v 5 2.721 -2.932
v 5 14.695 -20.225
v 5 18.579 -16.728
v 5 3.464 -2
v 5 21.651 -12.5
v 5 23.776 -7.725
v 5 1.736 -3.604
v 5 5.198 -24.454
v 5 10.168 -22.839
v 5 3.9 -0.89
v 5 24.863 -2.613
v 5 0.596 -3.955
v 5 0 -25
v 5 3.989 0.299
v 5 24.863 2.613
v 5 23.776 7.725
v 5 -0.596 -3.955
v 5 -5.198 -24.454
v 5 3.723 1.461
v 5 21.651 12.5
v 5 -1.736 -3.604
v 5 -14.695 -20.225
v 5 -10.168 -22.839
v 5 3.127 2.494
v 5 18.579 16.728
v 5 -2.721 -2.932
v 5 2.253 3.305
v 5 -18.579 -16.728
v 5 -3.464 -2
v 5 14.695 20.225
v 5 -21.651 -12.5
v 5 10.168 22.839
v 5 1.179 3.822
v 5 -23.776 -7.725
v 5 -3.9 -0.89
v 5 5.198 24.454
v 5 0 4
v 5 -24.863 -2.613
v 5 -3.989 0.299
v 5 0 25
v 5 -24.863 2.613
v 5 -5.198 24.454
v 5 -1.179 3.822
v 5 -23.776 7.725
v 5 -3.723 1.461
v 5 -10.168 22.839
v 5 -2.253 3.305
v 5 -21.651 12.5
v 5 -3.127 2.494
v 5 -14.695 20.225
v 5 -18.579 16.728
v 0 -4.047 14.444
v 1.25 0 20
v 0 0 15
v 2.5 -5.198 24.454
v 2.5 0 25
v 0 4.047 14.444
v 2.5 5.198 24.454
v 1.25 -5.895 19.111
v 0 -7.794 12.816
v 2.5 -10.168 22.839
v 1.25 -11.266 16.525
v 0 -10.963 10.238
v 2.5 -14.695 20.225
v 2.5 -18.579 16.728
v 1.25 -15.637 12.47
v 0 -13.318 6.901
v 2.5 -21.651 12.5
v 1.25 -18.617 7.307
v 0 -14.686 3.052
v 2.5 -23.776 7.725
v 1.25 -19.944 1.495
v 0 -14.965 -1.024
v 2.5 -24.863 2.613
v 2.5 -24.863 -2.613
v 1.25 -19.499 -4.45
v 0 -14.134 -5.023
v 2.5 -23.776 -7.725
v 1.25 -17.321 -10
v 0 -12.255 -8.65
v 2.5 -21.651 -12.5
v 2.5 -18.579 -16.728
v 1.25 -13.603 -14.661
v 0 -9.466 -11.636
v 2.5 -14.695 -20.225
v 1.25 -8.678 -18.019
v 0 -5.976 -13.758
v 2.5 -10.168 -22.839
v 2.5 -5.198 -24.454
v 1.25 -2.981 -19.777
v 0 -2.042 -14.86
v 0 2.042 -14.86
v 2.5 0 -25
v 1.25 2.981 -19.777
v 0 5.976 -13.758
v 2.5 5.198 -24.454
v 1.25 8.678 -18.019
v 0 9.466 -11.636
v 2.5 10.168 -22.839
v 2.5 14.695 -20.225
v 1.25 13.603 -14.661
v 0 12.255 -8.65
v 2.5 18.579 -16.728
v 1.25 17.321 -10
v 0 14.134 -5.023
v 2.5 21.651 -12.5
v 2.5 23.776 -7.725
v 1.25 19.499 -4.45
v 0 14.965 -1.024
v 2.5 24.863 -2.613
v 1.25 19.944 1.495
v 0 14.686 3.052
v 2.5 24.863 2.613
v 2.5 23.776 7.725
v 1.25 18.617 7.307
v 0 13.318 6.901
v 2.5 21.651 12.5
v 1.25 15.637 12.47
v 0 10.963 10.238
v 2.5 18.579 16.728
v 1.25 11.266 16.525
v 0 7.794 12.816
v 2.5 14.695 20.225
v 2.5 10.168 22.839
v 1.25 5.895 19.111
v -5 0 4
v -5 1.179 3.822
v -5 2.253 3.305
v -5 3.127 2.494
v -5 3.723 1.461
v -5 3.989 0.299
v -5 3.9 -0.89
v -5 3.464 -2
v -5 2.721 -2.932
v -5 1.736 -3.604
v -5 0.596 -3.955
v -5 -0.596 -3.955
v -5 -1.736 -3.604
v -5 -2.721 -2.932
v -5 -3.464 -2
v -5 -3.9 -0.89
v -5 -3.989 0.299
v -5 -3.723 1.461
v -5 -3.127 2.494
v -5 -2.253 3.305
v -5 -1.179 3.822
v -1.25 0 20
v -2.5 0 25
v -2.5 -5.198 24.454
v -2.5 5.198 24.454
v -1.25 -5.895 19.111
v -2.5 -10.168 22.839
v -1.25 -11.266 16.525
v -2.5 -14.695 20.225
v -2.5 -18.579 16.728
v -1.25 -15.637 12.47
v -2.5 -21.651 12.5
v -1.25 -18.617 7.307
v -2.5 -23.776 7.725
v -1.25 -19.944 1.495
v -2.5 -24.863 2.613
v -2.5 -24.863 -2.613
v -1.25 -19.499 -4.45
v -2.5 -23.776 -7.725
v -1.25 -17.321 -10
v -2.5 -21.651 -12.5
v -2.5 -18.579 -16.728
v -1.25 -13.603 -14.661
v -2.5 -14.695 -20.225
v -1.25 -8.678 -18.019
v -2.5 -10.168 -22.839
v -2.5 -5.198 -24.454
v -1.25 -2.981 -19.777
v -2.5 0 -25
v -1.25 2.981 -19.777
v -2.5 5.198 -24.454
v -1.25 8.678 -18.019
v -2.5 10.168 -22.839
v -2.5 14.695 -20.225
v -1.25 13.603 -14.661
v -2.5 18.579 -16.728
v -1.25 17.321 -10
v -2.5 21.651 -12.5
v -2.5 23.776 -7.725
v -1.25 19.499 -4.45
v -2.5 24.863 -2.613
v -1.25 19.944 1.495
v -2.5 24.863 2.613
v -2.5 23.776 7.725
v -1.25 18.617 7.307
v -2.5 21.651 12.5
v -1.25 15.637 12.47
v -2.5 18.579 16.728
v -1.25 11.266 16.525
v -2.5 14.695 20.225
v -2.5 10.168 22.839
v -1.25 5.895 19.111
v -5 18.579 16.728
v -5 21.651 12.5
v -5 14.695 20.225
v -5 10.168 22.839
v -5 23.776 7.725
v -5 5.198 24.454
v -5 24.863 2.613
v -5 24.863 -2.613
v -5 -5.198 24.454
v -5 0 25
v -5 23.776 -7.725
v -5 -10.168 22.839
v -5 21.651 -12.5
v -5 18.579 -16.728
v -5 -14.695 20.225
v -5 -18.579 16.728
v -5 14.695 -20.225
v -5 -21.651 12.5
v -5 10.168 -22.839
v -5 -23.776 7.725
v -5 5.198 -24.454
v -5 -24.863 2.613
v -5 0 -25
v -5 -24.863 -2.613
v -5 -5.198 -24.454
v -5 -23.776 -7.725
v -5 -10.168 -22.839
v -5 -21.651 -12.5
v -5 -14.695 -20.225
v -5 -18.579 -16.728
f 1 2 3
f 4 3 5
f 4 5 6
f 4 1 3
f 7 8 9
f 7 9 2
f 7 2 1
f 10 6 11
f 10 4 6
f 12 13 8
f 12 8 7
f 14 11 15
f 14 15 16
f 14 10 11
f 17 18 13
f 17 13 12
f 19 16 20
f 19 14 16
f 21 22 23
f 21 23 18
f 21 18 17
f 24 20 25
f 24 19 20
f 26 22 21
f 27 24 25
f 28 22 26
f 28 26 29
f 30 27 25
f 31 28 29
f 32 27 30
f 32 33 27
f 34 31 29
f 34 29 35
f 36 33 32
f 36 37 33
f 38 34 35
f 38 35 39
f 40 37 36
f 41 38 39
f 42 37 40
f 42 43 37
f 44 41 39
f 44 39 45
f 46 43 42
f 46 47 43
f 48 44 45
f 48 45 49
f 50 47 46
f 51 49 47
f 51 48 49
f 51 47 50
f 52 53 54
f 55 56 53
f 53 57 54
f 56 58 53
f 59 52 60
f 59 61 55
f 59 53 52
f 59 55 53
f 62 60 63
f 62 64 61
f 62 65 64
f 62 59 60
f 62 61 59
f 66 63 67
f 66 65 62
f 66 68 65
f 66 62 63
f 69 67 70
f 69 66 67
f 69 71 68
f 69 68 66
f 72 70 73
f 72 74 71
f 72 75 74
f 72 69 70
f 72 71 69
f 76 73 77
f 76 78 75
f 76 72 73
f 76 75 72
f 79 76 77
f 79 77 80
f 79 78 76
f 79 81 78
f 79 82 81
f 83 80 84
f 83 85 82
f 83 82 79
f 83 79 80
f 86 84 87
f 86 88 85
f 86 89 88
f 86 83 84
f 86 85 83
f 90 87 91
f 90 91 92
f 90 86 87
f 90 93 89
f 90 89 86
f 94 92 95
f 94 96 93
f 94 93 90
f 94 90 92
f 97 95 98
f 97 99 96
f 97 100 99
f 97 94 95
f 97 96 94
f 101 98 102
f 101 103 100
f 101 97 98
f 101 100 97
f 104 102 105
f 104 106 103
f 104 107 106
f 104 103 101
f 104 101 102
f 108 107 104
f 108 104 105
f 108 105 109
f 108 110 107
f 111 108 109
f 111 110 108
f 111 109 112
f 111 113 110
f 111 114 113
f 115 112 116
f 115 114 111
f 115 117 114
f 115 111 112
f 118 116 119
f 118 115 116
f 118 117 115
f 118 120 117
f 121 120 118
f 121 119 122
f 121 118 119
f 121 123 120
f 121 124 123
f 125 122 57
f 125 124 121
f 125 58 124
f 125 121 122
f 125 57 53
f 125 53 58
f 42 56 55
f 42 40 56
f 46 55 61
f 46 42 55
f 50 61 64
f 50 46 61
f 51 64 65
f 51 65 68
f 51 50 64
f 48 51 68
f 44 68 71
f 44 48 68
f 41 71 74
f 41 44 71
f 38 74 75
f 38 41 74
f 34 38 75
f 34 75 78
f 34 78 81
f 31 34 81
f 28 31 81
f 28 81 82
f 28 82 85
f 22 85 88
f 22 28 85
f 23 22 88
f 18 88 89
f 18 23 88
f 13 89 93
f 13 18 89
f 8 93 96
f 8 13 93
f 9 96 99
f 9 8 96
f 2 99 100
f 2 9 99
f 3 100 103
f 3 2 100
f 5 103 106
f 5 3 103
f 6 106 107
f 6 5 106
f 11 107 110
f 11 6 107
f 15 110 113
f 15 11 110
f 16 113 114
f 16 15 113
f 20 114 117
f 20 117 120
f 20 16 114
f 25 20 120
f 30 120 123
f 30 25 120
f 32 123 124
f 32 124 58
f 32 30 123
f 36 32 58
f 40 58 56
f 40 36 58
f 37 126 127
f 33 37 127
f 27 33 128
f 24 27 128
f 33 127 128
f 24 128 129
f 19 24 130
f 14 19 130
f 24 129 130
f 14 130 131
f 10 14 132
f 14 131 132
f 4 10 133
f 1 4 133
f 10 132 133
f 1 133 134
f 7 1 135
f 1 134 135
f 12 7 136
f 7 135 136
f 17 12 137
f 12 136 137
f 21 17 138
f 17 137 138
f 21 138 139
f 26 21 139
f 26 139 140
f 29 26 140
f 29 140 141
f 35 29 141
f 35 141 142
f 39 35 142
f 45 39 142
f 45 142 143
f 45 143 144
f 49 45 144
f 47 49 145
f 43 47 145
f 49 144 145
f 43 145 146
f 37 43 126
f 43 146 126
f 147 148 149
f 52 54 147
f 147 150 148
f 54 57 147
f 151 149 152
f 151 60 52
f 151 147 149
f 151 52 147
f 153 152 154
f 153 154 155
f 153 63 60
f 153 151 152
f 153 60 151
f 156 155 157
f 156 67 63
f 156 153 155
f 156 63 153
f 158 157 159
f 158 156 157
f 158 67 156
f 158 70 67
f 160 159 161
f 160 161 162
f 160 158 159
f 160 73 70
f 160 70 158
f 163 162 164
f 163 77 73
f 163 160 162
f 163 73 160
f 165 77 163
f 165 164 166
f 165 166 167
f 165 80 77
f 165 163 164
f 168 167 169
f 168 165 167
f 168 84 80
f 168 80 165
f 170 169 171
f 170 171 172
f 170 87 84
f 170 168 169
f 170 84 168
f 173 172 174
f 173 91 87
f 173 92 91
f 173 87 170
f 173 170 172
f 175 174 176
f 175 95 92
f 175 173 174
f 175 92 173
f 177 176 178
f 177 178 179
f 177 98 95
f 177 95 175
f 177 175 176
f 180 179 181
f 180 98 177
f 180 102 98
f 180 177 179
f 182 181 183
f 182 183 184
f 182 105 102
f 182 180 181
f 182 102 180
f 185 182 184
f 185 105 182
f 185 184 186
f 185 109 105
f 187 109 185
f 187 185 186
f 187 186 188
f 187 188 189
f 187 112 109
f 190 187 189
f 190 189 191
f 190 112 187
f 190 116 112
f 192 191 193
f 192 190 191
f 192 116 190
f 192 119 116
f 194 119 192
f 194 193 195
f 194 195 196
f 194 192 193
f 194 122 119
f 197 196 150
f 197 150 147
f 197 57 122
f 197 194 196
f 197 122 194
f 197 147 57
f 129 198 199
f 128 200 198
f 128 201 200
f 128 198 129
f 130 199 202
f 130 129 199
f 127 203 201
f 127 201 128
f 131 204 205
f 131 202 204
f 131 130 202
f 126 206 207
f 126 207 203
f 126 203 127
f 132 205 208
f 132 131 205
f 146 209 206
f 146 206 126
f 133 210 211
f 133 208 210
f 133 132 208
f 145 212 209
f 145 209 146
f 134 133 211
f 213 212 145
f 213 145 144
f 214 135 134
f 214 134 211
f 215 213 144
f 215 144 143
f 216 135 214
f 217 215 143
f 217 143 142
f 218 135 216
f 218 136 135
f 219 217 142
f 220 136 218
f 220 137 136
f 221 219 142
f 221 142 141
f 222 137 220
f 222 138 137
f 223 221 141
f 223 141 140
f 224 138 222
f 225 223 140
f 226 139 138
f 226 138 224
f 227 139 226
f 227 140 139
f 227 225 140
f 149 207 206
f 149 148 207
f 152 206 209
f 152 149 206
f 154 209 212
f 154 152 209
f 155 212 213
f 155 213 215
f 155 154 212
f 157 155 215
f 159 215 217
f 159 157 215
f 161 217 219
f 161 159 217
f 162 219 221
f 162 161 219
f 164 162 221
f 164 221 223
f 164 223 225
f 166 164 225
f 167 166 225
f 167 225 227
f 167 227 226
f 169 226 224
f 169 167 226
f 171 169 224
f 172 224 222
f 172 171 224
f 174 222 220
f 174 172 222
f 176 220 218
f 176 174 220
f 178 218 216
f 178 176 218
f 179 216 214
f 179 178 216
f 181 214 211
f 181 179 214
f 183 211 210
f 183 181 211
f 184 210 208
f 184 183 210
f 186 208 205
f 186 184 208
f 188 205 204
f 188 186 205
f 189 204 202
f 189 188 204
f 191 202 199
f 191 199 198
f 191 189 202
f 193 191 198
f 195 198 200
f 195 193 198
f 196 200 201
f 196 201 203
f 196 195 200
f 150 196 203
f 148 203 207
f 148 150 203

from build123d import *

# Parameters (mm, degrees)
SKETCH2_R          = 4
CUT_EXTRUDE1_DEPTH = 10


with BuildPart() as part:
    # Sketch1 → Revolve1 (revolve)
    with BuildSketch(Plane(origin=(0, 0, 0), x_dir=(1, 0, 0), z_dir=(0, 1, 0)), mode=Mode.PRIVATE) as revolve1_sk:
        Polygon((5, 0), (-5, 0), (-5, 25), (-2.5, 25), (0, 15), (2.5, 25), (5, 25), align=None)
    revolve(revolve1_sk.sketch.rotate(Axis((-18.958333333, 0, 0), (1, 0, 0)), 180), axis=Axis((-18.958333333, 0, 0), (1, 0, 0)))

    # Sketch2 → Cut-Extrude1 (cut)
    with BuildSketch(Plane.ZY.offset(5)):
        Circle(SKETCH2_R)
    extrude(amount=-CUT_EXTRUDE1_DEPTH, mode=Mode.SUBTRACT)


solid = part.part
